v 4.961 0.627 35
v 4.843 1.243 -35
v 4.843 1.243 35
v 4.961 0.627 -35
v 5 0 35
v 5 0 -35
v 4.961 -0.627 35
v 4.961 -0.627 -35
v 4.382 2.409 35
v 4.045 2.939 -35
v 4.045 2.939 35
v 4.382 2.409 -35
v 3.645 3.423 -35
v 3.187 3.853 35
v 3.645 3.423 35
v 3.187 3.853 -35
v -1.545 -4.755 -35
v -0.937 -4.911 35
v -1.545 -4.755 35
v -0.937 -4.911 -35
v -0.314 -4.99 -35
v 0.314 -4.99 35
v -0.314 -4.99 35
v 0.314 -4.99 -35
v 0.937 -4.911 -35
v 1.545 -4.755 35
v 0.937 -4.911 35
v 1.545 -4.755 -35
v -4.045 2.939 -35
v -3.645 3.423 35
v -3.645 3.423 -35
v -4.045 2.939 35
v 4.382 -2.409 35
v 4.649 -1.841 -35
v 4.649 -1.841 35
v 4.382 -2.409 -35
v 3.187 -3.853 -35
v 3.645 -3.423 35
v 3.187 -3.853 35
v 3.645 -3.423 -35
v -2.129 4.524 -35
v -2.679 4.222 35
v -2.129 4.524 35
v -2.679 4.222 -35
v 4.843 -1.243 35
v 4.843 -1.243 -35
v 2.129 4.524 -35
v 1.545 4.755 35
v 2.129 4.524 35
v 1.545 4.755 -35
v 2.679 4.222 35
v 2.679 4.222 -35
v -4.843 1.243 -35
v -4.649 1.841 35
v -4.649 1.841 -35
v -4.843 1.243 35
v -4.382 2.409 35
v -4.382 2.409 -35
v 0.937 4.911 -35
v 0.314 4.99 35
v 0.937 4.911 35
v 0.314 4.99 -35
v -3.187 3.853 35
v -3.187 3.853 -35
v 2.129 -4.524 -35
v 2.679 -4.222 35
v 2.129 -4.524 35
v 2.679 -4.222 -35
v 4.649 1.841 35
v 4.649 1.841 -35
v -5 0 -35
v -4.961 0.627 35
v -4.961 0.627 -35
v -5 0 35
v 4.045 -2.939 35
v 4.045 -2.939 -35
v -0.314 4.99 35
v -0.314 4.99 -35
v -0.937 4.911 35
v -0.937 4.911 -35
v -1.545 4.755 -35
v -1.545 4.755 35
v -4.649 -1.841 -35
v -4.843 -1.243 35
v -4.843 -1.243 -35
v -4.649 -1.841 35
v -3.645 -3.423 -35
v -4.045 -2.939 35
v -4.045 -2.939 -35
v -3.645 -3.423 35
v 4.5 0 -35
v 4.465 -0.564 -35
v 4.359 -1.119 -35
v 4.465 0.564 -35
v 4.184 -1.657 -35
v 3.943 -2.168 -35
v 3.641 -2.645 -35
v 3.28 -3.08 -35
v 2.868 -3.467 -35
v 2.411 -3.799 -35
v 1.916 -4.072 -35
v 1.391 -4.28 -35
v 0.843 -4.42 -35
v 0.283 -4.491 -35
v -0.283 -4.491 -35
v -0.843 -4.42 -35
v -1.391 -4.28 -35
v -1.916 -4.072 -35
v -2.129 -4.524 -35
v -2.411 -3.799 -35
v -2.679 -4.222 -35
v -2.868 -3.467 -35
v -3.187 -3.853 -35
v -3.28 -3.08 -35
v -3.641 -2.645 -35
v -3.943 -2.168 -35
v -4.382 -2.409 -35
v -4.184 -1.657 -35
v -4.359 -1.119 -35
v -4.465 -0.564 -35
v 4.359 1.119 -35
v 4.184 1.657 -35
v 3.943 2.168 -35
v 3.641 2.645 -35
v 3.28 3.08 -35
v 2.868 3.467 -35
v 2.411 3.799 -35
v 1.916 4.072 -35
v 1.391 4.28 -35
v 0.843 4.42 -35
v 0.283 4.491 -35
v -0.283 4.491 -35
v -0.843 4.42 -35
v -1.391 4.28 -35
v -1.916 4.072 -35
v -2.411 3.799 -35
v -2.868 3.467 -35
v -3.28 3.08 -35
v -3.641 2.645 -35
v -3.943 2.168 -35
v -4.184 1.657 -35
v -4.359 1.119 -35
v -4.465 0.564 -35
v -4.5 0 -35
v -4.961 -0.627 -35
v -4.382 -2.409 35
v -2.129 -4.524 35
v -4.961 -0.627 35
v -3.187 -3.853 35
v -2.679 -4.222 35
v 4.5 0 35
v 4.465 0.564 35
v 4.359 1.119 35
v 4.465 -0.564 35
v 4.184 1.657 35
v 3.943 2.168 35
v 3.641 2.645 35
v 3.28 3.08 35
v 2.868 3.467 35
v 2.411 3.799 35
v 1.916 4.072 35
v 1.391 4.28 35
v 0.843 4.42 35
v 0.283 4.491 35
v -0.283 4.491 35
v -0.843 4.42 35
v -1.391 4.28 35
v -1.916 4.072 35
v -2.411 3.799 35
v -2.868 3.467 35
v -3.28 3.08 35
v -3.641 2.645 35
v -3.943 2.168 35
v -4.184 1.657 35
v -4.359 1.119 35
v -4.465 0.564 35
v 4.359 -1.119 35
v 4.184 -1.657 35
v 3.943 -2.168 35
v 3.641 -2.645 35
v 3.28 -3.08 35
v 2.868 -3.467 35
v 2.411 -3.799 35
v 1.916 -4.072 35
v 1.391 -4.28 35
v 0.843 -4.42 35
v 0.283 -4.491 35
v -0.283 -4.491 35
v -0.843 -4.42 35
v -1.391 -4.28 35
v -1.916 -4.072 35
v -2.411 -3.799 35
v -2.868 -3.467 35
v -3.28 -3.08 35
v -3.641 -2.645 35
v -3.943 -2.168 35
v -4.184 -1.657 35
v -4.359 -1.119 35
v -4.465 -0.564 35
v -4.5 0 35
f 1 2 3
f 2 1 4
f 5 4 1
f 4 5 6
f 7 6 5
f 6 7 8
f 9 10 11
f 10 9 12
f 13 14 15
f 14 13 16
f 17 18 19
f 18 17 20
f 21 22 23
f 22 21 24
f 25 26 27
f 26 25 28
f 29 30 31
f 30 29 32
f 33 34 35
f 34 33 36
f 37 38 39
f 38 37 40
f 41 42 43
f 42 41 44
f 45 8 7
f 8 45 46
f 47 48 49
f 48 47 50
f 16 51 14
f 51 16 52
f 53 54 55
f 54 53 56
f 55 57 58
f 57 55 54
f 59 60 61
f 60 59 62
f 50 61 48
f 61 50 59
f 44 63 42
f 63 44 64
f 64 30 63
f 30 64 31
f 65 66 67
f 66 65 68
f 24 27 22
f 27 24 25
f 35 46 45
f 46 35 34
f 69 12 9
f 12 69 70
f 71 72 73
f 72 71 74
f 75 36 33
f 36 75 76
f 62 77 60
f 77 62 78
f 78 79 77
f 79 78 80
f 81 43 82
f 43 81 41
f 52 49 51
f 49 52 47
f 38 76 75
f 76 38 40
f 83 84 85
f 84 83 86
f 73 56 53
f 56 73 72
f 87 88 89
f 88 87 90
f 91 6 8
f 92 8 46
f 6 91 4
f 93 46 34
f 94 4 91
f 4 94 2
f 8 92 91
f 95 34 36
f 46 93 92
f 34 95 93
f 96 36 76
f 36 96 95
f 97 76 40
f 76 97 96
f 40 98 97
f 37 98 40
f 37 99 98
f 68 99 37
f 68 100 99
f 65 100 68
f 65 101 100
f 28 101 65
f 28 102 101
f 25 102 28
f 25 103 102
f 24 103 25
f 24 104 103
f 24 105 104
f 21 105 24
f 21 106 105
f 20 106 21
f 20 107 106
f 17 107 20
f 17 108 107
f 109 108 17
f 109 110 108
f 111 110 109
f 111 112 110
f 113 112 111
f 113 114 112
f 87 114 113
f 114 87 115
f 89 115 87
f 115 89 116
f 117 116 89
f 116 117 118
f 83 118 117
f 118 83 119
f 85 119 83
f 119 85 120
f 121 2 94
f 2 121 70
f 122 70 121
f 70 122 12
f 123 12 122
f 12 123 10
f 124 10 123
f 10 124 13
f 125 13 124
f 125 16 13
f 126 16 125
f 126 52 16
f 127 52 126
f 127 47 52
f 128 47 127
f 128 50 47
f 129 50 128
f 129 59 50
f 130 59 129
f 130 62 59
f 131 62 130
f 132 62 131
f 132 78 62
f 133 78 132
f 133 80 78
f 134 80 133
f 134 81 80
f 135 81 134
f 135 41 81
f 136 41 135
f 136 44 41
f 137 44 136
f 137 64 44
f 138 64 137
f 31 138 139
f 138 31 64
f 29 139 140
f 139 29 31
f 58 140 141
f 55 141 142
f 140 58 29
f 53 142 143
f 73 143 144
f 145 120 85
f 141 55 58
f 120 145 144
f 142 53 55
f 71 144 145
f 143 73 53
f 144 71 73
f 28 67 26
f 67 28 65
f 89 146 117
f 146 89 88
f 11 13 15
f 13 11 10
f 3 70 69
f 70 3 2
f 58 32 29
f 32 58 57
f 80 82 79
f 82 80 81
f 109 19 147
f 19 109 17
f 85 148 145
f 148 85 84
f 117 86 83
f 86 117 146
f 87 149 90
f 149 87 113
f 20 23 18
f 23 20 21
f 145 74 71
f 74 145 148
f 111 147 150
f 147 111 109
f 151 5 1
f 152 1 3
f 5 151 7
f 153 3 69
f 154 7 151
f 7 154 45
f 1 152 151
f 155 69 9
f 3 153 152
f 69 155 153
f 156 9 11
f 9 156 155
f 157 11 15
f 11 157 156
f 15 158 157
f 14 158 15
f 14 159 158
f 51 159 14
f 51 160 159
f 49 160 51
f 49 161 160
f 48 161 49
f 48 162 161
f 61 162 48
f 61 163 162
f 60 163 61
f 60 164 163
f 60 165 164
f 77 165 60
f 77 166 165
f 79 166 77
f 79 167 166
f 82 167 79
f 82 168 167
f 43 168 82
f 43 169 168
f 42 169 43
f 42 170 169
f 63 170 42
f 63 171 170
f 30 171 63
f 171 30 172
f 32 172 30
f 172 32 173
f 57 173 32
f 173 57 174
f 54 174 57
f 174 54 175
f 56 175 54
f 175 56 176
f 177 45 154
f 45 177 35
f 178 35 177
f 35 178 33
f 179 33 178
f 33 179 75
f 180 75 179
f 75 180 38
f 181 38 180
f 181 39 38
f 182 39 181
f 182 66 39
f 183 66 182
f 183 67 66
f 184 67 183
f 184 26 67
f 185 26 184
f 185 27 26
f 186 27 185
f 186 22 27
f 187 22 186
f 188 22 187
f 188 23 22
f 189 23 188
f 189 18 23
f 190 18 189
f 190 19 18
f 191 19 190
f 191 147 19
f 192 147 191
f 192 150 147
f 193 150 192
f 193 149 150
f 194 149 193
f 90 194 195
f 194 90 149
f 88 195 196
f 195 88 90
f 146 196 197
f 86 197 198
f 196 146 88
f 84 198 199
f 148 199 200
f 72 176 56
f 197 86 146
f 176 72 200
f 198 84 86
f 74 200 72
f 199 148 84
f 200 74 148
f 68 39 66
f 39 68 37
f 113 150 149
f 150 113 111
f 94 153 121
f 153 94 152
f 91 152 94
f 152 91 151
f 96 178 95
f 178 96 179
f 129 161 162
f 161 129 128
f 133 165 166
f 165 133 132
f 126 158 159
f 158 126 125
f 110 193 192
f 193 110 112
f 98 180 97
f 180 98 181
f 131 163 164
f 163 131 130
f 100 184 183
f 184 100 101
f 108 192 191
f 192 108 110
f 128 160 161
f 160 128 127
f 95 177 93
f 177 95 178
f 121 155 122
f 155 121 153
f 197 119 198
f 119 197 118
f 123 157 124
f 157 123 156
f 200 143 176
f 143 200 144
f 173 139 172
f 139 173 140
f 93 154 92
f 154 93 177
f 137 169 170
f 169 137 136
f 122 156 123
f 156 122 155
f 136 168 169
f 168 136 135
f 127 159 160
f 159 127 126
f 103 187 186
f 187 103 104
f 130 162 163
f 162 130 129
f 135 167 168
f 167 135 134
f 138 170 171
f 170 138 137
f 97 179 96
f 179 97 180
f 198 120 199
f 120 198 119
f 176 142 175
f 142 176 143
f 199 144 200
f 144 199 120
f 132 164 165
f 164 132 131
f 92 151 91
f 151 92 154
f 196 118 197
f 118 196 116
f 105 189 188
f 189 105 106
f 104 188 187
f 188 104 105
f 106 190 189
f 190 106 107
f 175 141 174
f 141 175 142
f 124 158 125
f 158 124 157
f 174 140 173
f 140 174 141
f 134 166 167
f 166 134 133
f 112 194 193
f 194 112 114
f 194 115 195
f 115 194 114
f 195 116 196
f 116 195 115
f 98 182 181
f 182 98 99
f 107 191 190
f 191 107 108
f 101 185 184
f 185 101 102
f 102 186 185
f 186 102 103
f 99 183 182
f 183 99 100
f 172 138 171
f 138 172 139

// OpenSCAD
$fn = 50;


difference() {
	union() {
		translate(v = [0, 0, -35.0000000000]) {
			cylinder(h = 70, r = 5.0000000000);
		}
	}
	union() {
		translate(v = [0, 0, -100.0000000000]) {
			cylinder(h = 200, r = 4.5000000000);
		}
	}
}
